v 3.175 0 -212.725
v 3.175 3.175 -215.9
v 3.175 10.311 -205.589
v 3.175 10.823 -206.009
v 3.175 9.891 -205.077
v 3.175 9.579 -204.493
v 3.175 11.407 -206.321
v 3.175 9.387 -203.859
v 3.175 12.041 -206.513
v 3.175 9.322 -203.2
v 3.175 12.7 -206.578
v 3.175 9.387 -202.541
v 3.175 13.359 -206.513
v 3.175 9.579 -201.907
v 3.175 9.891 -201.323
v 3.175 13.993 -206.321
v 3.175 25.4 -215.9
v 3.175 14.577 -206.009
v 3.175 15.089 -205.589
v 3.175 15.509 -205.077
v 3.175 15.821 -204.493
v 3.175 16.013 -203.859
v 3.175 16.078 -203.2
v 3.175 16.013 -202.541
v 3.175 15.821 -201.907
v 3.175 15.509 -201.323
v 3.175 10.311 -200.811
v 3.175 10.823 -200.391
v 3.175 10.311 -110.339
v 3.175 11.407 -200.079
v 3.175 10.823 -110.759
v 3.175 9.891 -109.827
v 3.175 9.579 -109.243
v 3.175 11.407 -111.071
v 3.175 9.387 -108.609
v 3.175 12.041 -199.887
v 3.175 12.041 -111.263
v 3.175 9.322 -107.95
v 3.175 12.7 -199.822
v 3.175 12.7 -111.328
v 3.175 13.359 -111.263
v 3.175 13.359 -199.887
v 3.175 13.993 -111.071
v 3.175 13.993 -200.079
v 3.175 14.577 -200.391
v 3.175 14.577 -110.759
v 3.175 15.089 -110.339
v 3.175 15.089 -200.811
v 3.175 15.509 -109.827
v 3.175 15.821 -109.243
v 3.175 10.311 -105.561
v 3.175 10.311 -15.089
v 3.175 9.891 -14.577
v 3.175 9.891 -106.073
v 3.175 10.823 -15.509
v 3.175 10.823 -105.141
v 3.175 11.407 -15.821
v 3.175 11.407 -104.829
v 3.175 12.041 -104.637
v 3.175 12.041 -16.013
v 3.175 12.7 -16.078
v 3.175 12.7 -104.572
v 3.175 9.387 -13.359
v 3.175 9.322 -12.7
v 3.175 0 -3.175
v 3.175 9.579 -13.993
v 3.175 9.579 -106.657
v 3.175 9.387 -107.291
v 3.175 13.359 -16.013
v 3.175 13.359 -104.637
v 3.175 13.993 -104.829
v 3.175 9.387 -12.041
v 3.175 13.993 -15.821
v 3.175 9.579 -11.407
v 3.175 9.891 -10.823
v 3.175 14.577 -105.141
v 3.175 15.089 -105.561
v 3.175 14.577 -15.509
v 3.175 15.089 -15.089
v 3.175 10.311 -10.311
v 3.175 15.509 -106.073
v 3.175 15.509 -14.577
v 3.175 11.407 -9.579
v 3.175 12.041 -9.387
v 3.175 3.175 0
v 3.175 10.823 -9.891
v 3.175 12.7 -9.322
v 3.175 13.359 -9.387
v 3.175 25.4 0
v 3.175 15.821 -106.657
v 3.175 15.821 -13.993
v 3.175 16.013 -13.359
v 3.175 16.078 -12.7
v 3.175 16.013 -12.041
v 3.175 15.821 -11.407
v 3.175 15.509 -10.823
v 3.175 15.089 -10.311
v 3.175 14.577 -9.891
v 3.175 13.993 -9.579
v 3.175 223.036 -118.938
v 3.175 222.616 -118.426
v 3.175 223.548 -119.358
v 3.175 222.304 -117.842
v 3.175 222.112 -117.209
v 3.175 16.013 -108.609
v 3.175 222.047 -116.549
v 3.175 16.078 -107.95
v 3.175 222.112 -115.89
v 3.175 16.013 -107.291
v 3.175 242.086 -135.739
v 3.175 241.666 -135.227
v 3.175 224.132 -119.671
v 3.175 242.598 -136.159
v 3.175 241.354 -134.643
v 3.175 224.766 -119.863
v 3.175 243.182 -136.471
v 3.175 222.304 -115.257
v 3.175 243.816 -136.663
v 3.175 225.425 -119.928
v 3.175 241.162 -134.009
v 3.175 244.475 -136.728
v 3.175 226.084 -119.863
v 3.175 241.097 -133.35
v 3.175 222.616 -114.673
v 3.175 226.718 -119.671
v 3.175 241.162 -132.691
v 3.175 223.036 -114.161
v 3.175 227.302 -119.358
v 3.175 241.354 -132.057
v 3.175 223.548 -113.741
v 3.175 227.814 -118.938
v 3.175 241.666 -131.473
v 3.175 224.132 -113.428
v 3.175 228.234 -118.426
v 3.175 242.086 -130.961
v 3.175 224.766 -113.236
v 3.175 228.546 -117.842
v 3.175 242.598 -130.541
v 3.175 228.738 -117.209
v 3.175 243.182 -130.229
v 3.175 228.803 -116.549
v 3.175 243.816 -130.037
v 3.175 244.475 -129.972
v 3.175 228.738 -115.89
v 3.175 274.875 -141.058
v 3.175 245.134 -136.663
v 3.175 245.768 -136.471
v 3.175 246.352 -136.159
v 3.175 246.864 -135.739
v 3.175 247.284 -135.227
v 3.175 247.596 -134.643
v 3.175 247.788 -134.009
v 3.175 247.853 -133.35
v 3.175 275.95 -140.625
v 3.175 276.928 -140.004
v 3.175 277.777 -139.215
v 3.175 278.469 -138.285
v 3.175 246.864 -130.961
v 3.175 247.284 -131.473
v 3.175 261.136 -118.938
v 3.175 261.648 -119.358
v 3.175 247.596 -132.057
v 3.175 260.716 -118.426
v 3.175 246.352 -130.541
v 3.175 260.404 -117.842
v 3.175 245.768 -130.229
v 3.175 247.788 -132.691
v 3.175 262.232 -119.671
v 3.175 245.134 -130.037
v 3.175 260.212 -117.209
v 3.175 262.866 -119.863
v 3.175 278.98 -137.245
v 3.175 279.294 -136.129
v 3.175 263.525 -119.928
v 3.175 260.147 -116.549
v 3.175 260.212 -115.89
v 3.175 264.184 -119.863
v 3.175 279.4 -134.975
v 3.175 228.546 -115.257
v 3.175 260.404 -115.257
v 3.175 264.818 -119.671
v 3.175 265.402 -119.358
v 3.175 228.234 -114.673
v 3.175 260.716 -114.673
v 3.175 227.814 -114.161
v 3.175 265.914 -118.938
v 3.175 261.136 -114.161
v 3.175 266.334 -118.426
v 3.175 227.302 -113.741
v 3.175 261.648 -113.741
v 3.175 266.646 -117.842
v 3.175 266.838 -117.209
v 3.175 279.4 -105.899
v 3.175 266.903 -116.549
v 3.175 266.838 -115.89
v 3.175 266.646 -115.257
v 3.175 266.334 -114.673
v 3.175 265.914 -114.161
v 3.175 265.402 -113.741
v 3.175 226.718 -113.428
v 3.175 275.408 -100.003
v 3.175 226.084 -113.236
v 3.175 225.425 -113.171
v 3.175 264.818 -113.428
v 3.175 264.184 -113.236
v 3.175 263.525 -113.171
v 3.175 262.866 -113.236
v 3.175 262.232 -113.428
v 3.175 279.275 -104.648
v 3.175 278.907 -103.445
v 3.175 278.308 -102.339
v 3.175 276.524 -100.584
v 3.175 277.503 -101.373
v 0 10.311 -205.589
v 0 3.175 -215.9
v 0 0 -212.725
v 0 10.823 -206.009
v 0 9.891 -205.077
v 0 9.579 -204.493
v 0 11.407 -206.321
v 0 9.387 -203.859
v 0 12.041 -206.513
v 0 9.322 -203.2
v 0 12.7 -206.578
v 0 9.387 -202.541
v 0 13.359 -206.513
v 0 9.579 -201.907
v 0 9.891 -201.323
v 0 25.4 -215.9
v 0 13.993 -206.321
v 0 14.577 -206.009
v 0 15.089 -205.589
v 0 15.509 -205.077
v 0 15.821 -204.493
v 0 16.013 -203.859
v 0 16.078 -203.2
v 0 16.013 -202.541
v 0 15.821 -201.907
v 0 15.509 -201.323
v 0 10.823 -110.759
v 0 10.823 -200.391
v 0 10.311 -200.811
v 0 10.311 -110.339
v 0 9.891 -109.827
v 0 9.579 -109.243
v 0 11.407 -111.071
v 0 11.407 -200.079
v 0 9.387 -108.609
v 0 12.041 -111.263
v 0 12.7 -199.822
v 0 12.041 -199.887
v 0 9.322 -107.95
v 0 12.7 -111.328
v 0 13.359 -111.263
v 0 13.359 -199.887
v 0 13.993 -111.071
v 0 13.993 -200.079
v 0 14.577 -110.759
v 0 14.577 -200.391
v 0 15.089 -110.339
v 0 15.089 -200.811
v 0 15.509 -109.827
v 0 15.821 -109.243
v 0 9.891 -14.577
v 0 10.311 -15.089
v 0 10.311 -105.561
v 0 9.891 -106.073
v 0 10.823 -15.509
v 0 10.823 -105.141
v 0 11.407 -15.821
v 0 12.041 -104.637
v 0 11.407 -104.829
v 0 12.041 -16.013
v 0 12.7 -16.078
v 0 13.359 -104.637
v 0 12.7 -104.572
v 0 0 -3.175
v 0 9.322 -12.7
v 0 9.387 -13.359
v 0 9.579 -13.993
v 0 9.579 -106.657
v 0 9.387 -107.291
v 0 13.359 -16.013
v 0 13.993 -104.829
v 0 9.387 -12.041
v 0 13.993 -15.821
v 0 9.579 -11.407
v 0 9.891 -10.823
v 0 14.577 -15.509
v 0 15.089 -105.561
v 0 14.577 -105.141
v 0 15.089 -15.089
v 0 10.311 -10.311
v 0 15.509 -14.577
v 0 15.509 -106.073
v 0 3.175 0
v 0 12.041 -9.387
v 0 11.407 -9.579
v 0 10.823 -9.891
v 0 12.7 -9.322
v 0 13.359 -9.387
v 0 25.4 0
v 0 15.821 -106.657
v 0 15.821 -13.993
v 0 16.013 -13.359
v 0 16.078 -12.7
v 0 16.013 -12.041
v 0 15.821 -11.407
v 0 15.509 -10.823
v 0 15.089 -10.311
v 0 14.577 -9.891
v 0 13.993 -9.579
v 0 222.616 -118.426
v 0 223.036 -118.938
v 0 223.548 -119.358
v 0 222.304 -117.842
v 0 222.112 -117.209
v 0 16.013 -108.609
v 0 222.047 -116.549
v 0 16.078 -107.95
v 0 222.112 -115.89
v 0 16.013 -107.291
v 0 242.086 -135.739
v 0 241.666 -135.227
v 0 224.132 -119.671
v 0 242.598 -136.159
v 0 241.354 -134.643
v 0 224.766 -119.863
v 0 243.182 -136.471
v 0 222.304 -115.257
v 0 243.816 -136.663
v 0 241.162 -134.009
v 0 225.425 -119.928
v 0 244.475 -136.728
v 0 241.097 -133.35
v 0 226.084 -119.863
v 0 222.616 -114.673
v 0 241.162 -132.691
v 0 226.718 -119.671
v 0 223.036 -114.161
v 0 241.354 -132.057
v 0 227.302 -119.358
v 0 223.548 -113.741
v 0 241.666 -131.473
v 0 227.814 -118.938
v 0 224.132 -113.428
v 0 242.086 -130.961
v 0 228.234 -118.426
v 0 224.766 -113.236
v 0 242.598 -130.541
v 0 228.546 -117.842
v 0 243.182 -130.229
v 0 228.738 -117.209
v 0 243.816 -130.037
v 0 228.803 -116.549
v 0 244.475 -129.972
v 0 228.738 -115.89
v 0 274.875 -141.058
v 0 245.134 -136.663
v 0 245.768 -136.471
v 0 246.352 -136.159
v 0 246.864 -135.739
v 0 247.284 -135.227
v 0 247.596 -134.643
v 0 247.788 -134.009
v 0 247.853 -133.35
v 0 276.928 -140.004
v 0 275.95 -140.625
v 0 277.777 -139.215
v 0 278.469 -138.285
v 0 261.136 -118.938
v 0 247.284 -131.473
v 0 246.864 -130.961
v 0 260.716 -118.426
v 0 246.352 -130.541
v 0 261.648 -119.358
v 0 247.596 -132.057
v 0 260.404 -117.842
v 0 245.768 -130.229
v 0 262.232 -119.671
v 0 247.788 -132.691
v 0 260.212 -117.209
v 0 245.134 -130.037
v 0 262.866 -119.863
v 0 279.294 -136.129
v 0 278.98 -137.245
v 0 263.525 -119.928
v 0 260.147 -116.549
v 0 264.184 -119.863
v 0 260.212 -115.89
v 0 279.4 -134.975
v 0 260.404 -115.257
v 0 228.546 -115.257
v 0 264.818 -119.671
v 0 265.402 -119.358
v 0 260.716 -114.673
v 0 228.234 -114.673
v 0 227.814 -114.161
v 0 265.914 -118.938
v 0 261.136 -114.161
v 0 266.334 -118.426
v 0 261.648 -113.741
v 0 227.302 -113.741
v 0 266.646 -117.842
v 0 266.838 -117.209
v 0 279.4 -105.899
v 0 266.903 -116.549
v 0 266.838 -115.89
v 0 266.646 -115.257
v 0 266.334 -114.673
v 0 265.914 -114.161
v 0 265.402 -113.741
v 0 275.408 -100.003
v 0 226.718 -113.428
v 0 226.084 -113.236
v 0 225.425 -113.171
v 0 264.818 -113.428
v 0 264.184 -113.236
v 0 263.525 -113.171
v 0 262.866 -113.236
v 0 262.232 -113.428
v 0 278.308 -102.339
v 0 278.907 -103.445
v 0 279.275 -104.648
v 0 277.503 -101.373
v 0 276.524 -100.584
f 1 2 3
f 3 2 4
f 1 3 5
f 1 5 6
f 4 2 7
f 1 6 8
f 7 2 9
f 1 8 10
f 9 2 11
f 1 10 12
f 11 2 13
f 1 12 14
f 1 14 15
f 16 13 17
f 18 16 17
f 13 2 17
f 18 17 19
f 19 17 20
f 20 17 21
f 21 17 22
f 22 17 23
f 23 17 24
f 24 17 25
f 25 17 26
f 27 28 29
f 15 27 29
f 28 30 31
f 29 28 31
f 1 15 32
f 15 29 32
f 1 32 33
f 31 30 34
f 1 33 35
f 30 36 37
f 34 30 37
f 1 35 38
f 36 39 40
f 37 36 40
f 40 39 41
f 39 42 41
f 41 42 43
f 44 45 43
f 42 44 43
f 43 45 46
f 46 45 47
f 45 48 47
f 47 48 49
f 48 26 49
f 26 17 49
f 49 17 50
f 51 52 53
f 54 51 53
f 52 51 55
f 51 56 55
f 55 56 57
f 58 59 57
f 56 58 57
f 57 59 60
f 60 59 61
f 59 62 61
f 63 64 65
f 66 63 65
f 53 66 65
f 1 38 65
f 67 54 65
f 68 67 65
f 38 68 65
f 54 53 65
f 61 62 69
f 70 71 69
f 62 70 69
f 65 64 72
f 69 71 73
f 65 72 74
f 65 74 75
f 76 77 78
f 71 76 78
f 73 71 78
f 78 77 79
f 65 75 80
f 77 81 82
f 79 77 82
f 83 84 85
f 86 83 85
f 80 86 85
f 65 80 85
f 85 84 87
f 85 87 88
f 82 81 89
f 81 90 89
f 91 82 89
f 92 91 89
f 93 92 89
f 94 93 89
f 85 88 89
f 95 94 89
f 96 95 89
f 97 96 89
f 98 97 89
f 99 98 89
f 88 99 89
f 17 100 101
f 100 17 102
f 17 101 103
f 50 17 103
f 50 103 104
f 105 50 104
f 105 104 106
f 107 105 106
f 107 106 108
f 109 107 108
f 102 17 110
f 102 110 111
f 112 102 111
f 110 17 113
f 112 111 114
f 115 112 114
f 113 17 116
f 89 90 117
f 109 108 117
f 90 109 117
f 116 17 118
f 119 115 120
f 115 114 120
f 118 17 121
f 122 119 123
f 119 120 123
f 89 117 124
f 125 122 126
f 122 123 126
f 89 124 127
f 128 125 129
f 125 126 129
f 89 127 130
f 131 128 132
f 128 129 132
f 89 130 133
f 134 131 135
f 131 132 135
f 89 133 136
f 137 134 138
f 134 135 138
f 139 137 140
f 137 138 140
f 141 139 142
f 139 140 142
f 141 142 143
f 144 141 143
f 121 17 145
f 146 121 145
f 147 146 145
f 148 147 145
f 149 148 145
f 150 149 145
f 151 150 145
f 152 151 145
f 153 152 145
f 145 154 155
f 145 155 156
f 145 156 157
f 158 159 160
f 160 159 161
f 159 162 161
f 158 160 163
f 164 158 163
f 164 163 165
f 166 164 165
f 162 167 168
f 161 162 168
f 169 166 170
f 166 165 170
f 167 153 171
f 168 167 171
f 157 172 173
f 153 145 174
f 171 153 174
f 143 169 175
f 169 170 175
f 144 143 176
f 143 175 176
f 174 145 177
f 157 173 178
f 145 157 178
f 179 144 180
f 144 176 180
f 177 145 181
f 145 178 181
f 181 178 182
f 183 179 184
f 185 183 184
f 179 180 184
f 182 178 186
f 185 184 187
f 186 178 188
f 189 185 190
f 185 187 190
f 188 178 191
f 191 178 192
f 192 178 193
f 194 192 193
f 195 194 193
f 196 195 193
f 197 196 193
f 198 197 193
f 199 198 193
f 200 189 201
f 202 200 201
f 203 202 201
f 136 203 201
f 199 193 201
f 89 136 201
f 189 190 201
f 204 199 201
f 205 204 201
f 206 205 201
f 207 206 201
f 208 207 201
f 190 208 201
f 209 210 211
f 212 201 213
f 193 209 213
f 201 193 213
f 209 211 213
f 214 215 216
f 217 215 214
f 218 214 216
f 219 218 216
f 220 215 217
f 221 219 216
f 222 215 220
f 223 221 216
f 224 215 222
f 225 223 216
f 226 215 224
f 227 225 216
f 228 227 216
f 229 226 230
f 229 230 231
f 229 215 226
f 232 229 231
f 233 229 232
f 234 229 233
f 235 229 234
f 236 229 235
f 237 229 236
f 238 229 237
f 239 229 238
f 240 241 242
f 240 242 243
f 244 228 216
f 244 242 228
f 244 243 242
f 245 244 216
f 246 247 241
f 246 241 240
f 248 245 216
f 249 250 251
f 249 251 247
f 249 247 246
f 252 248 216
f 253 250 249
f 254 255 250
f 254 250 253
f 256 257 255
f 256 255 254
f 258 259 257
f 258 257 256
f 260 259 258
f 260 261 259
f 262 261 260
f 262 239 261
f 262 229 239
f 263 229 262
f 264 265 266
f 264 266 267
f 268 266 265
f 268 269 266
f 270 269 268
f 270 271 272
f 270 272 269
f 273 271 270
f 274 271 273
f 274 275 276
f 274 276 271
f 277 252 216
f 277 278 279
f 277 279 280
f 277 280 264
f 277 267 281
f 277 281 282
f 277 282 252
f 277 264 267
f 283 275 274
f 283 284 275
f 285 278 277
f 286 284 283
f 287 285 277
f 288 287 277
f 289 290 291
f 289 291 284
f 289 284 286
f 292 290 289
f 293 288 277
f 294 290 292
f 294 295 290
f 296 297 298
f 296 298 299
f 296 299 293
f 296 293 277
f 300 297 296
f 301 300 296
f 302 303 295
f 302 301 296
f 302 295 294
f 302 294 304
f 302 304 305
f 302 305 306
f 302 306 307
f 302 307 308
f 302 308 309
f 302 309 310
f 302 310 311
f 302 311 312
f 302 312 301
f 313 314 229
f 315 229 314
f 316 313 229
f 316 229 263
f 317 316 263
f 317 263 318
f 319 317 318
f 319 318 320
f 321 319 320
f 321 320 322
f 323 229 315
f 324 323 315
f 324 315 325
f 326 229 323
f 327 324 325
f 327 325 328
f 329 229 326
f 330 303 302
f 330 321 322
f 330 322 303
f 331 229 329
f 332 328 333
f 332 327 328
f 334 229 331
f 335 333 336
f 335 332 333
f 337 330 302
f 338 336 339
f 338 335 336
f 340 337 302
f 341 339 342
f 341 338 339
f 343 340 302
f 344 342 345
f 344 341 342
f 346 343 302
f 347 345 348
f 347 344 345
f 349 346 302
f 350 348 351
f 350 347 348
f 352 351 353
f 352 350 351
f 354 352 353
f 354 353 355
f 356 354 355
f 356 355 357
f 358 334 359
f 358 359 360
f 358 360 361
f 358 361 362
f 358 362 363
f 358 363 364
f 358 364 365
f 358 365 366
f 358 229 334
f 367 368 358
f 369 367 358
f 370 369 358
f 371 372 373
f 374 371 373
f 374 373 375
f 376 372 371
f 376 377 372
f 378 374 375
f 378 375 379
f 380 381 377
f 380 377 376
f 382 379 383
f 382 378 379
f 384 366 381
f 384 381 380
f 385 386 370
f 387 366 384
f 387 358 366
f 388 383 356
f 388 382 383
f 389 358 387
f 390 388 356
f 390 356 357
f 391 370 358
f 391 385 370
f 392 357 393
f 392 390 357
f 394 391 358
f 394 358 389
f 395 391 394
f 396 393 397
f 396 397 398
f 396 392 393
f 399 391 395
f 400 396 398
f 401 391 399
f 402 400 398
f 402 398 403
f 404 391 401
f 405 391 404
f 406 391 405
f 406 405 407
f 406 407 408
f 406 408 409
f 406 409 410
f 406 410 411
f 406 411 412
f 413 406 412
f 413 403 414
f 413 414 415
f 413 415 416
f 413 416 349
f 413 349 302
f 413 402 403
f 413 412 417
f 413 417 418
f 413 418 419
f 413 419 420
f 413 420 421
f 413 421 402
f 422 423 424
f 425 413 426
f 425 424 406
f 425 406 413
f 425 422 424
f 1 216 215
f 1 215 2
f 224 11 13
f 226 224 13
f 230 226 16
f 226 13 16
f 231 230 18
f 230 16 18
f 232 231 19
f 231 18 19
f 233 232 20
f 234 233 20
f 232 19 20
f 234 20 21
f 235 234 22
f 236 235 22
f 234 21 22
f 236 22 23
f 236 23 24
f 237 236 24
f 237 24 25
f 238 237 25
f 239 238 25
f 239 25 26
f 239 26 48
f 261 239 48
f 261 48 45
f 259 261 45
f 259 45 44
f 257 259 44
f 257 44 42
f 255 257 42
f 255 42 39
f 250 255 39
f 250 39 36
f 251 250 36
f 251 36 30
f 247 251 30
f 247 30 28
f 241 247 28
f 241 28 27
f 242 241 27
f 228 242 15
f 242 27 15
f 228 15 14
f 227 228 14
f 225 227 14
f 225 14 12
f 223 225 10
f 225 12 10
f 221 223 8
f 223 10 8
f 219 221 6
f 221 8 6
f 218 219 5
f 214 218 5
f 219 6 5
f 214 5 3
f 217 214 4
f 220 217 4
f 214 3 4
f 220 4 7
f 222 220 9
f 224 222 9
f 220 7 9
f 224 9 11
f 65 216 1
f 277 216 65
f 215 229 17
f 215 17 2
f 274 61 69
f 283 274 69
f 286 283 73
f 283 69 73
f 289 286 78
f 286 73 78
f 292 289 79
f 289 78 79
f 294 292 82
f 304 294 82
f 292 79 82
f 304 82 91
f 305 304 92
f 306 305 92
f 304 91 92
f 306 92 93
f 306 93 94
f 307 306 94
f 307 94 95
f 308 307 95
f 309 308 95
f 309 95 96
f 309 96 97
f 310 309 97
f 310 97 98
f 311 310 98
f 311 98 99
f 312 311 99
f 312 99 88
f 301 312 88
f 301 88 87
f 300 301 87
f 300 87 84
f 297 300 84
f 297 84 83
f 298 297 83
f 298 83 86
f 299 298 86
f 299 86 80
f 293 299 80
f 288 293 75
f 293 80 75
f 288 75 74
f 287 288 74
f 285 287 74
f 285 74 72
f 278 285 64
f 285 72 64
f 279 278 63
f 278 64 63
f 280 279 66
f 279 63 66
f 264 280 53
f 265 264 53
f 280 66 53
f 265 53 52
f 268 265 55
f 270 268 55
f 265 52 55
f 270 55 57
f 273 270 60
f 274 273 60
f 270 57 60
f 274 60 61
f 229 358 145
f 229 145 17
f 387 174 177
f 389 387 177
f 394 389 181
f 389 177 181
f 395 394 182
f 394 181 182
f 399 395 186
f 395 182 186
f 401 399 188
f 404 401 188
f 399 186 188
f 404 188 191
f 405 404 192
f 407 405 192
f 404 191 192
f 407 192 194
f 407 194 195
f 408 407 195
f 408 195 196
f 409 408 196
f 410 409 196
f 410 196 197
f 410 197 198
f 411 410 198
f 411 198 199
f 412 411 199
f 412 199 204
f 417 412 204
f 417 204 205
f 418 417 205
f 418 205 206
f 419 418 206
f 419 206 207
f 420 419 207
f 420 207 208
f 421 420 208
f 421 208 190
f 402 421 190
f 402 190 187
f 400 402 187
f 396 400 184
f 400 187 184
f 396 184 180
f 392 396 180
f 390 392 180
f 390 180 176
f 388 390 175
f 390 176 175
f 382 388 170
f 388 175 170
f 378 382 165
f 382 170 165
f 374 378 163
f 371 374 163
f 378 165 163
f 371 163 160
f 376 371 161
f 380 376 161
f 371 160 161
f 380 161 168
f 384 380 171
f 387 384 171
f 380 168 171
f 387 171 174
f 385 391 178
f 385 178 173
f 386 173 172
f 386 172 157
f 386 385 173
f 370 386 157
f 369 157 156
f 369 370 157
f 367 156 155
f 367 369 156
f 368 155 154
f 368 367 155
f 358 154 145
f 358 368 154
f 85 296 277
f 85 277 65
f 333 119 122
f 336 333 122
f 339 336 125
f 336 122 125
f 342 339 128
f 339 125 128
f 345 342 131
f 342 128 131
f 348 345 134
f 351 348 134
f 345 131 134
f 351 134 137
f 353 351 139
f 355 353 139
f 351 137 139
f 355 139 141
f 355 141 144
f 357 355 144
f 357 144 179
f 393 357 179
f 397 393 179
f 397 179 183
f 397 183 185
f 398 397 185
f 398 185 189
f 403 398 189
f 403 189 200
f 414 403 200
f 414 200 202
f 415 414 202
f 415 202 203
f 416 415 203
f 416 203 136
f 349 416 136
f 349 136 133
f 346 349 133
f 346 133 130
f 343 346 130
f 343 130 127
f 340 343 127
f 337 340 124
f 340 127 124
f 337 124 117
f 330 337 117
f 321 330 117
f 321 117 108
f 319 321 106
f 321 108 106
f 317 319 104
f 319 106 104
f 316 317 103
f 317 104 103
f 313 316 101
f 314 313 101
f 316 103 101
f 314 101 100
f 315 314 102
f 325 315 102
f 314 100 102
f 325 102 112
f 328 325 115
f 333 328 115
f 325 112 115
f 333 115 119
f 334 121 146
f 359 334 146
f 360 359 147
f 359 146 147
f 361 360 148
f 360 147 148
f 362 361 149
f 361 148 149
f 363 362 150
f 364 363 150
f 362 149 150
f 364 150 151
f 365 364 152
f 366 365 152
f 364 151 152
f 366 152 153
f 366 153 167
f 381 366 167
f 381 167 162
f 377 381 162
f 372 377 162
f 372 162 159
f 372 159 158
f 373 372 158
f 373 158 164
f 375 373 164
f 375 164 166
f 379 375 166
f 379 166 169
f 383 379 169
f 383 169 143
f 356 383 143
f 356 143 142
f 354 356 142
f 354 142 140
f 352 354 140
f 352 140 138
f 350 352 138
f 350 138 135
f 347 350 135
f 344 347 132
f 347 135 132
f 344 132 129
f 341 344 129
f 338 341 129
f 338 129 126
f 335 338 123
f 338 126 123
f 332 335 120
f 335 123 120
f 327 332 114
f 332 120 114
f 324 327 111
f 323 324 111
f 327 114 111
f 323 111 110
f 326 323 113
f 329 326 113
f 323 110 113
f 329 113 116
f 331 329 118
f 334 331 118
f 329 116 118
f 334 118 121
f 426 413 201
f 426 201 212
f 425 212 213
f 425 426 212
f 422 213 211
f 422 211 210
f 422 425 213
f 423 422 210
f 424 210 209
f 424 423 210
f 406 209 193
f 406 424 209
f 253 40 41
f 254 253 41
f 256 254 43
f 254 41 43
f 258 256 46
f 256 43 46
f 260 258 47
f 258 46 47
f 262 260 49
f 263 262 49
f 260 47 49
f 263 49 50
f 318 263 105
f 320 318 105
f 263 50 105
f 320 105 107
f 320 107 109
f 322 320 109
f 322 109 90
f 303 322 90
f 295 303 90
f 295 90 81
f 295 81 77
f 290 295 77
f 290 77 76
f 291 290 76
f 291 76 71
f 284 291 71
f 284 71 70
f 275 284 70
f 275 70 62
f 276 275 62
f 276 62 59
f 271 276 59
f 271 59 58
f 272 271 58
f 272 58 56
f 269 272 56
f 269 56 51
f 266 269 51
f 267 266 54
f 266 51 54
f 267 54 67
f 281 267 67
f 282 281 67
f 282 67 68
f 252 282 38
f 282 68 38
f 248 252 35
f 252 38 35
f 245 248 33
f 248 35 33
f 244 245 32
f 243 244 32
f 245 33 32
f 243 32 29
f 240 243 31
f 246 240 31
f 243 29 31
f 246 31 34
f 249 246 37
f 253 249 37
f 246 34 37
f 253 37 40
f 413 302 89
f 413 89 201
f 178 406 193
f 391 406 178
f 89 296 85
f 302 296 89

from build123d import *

# Parameters (mm, degrees)
BOSS_EXTRUDE1_DEPTH = 3.175
SKETCH3_R           = 3.3782
CUT_EXTRUDE2_DEPTH  = 354.110819184
SKETCH4_R           = 3.3782
CUT_EXTRUDE3_DEPTH  = 354.110819184
CHAMFER1_SIZE       = 3.175


with BuildPart() as part:
    # Sketch1 → Boss-Extrude1 (new body)
    with BuildSketch(Plane(origin=(0, 0, 0), x_dir=(0, 0, -1), z_dir=(1, 0, 0))):
        with BuildLine():
            Line((105.899159305, 279.4), (134.975405367, 279.4))
            ThreePointArc((134.975405367, 279.4), (138.76591423, 278.144560095), (141.057602278, 274.874659073))
            Line((141.057602278, 274.874659073), (215.9, 25.4))
            Line((215.9, 25.4), (215.9, 0))
            Line((215.9, 0), (0, 0))
            Line((0, 0), (0, 25.4))
            Line((0, 25.4), (100.003332318, 275.408330795))
            ThreePointArc((100.003332318, 275.408330795), (102.339166366, 278.308226913), (105.899159305, 279.4))
        make_face()
    extrude(amount=BOSS_EXTRUDE1_DEPTH)

    # Sketch3 → Cut-Extrude2 (cut, through all)
    with BuildSketch(Plane(origin=(3.175, 0, 0), x_dir=(0, 0, -1), z_dir=(1, 0, 0))):
        with Locations((133.35, 244.475)):
            Circle(SKETCH3_R)
        with Locations((116.549479175, 225.425)):
            Circle(SKETCH3_R)
        with Locations((116.549479175, 263.525)):
            Circle(SKETCH3_R)
    extrude(amount=-CUT_EXTRUDE2_DEPTH, mode=Mode.SUBTRACT)

    # Sketch4 → Cut-Extrude3 (cut, through all)
    with BuildSketch(Plane(origin=(3.175, 0, 0), x_dir=(0, 0, -1), z_dir=(1, 0, 0))):
        with Locations((12.7, 12.7)):
            Circle(SKETCH4_R)
        with Locations((107.95, 12.7)):
            Circle(SKETCH4_R)
        with Locations((203.2, 12.7)):
            Circle(SKETCH4_R)
    extrude(amount=-CUT_EXTRUDE3_DEPTH, mode=Mode.SUBTRACT)

    # Chamfer1
    chamfer1_edges = [part.edges().sort_by_distance(p)[0] for p in [
        (1.5875, 0, -215.9),
        (1.5875, 0, 0),
    ]]
    chamfer(chamfer1_edges, length=CHAMFER1_SIZE)


solid = part.part
